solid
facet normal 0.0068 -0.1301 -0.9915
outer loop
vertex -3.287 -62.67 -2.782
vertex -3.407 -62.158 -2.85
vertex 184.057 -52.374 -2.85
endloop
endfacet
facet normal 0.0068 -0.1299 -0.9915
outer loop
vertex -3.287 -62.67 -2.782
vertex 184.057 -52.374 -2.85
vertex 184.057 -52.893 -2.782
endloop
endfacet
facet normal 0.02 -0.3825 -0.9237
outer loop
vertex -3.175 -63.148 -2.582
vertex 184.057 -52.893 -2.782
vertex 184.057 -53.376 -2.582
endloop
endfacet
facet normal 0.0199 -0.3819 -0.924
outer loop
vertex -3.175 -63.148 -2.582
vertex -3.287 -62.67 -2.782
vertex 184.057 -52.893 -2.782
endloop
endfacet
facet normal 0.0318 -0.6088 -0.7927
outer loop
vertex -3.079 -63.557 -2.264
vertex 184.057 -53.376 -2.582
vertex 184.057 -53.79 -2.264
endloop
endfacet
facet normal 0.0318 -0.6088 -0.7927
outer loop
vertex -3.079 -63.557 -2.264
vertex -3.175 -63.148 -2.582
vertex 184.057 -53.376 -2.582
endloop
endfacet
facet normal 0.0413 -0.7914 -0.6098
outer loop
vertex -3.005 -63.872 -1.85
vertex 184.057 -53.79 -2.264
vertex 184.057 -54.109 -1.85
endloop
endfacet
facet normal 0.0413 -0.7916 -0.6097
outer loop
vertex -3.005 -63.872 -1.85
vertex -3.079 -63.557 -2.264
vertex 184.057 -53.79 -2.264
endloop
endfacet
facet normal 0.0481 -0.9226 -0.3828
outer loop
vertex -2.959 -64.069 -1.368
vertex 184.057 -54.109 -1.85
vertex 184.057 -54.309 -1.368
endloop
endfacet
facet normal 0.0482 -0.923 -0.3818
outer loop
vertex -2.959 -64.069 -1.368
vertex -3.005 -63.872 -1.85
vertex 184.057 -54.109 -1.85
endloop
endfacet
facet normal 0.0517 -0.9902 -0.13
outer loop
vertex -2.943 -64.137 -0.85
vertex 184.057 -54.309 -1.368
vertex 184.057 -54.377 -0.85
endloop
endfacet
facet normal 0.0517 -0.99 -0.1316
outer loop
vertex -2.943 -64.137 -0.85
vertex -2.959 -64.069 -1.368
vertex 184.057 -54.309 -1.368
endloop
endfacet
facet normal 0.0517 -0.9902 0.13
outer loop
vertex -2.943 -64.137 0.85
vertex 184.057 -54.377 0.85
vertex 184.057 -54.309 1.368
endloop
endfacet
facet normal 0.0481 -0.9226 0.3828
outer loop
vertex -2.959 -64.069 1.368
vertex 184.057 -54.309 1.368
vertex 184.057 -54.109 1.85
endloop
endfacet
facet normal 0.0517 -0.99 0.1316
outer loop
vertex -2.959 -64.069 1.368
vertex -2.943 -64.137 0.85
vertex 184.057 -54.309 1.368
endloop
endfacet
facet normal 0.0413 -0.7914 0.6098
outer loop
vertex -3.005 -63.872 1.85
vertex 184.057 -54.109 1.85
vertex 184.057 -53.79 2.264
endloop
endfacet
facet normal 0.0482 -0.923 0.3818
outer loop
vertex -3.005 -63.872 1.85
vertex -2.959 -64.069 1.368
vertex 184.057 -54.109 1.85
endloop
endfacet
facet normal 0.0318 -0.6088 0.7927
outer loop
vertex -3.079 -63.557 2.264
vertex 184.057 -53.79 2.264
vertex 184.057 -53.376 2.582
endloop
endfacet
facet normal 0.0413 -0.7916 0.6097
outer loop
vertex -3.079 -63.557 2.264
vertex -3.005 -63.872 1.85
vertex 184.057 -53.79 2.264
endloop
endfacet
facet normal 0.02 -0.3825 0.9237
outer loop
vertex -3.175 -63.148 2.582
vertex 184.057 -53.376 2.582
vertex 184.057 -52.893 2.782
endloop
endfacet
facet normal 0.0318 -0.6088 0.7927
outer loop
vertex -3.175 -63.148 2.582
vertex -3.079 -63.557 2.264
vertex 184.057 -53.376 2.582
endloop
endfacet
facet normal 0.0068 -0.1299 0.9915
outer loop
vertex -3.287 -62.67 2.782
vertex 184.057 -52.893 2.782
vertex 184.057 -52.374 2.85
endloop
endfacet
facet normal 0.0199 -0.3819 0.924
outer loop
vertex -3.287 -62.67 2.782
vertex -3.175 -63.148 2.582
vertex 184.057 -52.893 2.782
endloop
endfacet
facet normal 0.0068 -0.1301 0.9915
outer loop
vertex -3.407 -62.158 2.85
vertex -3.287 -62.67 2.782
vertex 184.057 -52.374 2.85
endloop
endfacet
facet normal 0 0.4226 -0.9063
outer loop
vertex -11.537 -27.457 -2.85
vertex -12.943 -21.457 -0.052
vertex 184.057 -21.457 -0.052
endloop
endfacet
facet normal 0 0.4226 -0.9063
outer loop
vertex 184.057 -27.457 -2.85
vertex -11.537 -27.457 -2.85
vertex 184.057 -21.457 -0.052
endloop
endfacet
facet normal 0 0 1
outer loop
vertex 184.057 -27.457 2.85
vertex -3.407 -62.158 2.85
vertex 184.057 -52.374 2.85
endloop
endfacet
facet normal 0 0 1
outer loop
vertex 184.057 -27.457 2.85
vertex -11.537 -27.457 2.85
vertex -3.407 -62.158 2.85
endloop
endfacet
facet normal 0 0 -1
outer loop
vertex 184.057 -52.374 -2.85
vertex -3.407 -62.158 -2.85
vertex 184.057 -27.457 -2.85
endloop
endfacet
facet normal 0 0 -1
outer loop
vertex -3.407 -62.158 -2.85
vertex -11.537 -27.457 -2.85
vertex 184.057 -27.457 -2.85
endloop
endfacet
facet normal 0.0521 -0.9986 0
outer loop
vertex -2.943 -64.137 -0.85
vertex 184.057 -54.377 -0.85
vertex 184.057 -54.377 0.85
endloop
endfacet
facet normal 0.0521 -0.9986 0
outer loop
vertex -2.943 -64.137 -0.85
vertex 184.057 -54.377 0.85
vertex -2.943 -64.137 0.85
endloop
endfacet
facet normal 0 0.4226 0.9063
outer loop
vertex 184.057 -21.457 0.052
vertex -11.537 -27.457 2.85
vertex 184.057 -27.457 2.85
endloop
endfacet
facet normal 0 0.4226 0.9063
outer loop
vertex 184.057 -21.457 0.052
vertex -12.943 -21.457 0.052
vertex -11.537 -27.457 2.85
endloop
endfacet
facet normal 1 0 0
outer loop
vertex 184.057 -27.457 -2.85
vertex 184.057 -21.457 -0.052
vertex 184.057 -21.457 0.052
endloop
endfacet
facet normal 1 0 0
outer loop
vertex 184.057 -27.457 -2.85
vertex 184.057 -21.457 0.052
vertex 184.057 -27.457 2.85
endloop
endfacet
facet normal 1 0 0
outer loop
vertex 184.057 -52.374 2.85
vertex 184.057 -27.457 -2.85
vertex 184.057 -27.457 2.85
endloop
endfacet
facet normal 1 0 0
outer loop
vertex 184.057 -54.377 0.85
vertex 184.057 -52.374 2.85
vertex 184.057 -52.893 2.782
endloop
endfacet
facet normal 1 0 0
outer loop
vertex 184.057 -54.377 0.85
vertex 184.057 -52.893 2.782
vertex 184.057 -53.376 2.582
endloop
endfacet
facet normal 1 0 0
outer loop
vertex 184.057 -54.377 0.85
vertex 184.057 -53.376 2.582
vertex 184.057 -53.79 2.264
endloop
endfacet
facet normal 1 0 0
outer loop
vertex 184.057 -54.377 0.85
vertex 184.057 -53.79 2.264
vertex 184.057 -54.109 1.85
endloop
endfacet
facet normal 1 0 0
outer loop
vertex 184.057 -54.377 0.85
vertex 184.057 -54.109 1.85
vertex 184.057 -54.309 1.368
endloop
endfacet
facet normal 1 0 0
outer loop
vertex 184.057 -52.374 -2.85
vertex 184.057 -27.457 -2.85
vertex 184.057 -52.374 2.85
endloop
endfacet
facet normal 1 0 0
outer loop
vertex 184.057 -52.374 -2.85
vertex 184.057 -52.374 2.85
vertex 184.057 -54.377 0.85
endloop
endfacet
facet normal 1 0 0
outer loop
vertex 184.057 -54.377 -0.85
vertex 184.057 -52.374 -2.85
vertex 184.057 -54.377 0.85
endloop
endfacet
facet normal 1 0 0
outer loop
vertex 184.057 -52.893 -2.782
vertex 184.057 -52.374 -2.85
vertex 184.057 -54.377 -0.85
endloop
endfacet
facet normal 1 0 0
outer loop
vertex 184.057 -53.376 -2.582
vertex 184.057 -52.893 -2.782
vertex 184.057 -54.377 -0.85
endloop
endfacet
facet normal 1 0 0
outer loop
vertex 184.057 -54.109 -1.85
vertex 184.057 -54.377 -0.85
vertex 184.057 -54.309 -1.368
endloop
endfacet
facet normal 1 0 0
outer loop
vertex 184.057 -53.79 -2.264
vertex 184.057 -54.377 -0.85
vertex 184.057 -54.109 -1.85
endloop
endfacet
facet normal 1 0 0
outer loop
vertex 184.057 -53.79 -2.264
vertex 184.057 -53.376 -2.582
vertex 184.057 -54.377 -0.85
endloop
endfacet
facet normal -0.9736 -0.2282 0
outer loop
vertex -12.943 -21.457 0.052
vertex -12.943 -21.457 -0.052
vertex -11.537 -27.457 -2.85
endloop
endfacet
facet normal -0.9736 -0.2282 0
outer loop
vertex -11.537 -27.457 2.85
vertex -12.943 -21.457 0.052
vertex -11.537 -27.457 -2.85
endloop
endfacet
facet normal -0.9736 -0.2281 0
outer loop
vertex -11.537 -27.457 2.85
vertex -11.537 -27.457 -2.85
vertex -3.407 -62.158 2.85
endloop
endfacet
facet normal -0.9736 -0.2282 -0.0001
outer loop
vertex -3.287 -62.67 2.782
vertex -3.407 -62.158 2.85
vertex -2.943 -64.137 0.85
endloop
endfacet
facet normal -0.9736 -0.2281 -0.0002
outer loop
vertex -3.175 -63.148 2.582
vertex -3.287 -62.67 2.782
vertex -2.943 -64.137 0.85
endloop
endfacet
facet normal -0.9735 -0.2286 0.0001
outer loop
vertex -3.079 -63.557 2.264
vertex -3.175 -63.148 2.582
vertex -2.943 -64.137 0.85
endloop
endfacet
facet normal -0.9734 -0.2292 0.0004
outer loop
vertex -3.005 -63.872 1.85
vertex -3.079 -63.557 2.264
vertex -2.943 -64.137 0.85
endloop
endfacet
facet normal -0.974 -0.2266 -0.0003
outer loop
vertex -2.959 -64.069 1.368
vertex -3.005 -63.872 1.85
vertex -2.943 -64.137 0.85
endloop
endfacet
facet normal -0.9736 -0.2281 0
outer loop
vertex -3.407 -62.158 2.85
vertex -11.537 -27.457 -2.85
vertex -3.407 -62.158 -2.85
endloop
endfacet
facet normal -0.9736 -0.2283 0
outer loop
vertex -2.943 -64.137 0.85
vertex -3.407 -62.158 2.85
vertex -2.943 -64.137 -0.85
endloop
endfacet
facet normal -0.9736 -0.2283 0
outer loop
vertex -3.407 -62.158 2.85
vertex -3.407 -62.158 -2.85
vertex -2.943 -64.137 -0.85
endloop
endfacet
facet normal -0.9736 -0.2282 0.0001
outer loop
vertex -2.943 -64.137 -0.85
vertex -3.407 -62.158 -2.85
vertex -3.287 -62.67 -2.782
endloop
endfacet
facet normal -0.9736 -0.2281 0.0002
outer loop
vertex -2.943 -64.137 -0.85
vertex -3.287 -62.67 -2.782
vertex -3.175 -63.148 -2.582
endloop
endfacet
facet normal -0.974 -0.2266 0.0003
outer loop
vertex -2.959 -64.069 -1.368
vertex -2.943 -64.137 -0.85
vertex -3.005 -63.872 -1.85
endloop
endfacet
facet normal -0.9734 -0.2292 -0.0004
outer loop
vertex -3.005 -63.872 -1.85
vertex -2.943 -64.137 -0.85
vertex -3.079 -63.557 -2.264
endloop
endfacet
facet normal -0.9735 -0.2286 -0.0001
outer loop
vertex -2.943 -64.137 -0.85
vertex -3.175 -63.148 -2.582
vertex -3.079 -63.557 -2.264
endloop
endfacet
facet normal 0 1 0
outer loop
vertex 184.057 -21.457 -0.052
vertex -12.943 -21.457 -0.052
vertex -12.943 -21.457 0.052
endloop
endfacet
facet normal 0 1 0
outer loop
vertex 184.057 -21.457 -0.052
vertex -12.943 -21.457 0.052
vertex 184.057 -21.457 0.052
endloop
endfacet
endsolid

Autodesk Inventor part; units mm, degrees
ref_plane "YZ Plane" through (0, 0, 0) normal (1, 0, 0) x (0, 1, 0)
ref_plane "XZ Plane" through (0, 0, 0) normal (0, 1, 0) x (-1, 0, 0)
ref_plane "XY Plane" through (0, 0, 0) normal (0, 0, 1) x (1, 0, 0)
sketch "Sketch1" plane through (0, 0, 0) normal (0, 0, 1) x (1, 0, 0)
  line L0 (-22.943, -21.4569) -> (193.057, -21.4569)
  line L1 (-22.943, -21.4569) -> (-12.943, -21.4569)
  line L2 (-12.943, -21.4569) -> (-2.943, -21.4569)
  line L3 (-2.943, -21.4569) -> (-2.943, -64.1369)
  line L4 (-22.943, -21.4569) -> (184.057, -21.4569)
  line L5 (184.057, -21.4569) -> (184.057, -54.3769)
  line L6 (184.057, -54.3769) -> (-2.943, -64.1369)
  line L7 (-12.943, -21.4569) -> (-2.943, -64.1369)
  line L8 (184.057, -21.4569) -> (184.057, 33.1531)
  line L9 (-22.943, -21.4569) -> (-22.943, 89.8331)
  line L10 (-22.943, 89.8331) -> (184.057, 33.1531)
  line L11 (184.057, 33.1531) -> (184.057, 34.1531)
  line L12 (184.057, 34.1531) -> (193.057, 31.6888)
  line L13 (193.057, -21.4569) -> (193.057, 31.6888)
  line L14 (184.057, -54.3769) -> (193.057, -53.9072)
  line L15 (193.057, -21.4569) -> (193.057, -53.9072)
  line L16 (-22.943, -21.4569) -> (-32.943, -21.4569)
  line L17 (-32.943, -21.4569) -> (-42.943, -21.4569)
  line L18 (-22.943, -21.4569) -> (-229.943, -21.4569)
  line L19 (-229.943, -21.4569) -> (-229.943, -54.3769)
  line L20 (-42.943, -21.4569) -> (-42.943, -64.1369)
  line L21 (-229.943, -54.3769) -> (-42.943, -64.1369)
  line L22 (-32.943, -21.4569) -> (-42.943, -64.1369)
  line L23 (-238.943, -21.4569) -> (-238.943, -53.9072)
  line L24 (-229.943, -54.3769) -> (-238.943, -53.9072)
  line L25 (-22.943, -21.4569) -> (-238.943, -21.4569)
  line L26 (-238.943, -21.4569) -> (-238.943, 31.6888)
  line L27 (-229.943, 34.1531) -> (-238.943, 31.6888)
  line L28 (-229.943, -21.4569) -> (-229.943, 33.1531)
  line L29 (-229.943, 33.1531) -> (-229.943, 34.1531)
  line L30 (-22.943, 89.8331) -> (-229.943, 33.1531)
  point P0 (0, 0)
  dimension "d0" = 216
  dimension "d1" = 10
  dimension "d2" = 10
  dimension "d3" = 42.68
  dimension "d4" = 207
  dimension "d5" = 32.92
  dimension "d6" = 54.61
  dimension "d7" = 111.29
  dimension "d8" = 1
extrude "Extrusion1" add sketch "Sketch1" along normal mid plane 5.7 contours L0 L3 L7 | L0 L5 L6 L3
chamfer "Chamfer1" distance 6 angle 25 1 edges at (85.557, -21.4569, -2.85) measured on face at (56.057, -35.6836, -2.85)
fillet "Fillet1" radius 2 1 edges at (90.557, -59.2569, 2.85)
fillet "Fillet2" radius 2 1 edges at (90.557, -59.2569, -2.85)
chamfer "Chamfer2" distance 6 angle 25 1 edges at (85.557, -21.4569, 2.85) measured on face at (55.9024, -35.0241, 2.85)
